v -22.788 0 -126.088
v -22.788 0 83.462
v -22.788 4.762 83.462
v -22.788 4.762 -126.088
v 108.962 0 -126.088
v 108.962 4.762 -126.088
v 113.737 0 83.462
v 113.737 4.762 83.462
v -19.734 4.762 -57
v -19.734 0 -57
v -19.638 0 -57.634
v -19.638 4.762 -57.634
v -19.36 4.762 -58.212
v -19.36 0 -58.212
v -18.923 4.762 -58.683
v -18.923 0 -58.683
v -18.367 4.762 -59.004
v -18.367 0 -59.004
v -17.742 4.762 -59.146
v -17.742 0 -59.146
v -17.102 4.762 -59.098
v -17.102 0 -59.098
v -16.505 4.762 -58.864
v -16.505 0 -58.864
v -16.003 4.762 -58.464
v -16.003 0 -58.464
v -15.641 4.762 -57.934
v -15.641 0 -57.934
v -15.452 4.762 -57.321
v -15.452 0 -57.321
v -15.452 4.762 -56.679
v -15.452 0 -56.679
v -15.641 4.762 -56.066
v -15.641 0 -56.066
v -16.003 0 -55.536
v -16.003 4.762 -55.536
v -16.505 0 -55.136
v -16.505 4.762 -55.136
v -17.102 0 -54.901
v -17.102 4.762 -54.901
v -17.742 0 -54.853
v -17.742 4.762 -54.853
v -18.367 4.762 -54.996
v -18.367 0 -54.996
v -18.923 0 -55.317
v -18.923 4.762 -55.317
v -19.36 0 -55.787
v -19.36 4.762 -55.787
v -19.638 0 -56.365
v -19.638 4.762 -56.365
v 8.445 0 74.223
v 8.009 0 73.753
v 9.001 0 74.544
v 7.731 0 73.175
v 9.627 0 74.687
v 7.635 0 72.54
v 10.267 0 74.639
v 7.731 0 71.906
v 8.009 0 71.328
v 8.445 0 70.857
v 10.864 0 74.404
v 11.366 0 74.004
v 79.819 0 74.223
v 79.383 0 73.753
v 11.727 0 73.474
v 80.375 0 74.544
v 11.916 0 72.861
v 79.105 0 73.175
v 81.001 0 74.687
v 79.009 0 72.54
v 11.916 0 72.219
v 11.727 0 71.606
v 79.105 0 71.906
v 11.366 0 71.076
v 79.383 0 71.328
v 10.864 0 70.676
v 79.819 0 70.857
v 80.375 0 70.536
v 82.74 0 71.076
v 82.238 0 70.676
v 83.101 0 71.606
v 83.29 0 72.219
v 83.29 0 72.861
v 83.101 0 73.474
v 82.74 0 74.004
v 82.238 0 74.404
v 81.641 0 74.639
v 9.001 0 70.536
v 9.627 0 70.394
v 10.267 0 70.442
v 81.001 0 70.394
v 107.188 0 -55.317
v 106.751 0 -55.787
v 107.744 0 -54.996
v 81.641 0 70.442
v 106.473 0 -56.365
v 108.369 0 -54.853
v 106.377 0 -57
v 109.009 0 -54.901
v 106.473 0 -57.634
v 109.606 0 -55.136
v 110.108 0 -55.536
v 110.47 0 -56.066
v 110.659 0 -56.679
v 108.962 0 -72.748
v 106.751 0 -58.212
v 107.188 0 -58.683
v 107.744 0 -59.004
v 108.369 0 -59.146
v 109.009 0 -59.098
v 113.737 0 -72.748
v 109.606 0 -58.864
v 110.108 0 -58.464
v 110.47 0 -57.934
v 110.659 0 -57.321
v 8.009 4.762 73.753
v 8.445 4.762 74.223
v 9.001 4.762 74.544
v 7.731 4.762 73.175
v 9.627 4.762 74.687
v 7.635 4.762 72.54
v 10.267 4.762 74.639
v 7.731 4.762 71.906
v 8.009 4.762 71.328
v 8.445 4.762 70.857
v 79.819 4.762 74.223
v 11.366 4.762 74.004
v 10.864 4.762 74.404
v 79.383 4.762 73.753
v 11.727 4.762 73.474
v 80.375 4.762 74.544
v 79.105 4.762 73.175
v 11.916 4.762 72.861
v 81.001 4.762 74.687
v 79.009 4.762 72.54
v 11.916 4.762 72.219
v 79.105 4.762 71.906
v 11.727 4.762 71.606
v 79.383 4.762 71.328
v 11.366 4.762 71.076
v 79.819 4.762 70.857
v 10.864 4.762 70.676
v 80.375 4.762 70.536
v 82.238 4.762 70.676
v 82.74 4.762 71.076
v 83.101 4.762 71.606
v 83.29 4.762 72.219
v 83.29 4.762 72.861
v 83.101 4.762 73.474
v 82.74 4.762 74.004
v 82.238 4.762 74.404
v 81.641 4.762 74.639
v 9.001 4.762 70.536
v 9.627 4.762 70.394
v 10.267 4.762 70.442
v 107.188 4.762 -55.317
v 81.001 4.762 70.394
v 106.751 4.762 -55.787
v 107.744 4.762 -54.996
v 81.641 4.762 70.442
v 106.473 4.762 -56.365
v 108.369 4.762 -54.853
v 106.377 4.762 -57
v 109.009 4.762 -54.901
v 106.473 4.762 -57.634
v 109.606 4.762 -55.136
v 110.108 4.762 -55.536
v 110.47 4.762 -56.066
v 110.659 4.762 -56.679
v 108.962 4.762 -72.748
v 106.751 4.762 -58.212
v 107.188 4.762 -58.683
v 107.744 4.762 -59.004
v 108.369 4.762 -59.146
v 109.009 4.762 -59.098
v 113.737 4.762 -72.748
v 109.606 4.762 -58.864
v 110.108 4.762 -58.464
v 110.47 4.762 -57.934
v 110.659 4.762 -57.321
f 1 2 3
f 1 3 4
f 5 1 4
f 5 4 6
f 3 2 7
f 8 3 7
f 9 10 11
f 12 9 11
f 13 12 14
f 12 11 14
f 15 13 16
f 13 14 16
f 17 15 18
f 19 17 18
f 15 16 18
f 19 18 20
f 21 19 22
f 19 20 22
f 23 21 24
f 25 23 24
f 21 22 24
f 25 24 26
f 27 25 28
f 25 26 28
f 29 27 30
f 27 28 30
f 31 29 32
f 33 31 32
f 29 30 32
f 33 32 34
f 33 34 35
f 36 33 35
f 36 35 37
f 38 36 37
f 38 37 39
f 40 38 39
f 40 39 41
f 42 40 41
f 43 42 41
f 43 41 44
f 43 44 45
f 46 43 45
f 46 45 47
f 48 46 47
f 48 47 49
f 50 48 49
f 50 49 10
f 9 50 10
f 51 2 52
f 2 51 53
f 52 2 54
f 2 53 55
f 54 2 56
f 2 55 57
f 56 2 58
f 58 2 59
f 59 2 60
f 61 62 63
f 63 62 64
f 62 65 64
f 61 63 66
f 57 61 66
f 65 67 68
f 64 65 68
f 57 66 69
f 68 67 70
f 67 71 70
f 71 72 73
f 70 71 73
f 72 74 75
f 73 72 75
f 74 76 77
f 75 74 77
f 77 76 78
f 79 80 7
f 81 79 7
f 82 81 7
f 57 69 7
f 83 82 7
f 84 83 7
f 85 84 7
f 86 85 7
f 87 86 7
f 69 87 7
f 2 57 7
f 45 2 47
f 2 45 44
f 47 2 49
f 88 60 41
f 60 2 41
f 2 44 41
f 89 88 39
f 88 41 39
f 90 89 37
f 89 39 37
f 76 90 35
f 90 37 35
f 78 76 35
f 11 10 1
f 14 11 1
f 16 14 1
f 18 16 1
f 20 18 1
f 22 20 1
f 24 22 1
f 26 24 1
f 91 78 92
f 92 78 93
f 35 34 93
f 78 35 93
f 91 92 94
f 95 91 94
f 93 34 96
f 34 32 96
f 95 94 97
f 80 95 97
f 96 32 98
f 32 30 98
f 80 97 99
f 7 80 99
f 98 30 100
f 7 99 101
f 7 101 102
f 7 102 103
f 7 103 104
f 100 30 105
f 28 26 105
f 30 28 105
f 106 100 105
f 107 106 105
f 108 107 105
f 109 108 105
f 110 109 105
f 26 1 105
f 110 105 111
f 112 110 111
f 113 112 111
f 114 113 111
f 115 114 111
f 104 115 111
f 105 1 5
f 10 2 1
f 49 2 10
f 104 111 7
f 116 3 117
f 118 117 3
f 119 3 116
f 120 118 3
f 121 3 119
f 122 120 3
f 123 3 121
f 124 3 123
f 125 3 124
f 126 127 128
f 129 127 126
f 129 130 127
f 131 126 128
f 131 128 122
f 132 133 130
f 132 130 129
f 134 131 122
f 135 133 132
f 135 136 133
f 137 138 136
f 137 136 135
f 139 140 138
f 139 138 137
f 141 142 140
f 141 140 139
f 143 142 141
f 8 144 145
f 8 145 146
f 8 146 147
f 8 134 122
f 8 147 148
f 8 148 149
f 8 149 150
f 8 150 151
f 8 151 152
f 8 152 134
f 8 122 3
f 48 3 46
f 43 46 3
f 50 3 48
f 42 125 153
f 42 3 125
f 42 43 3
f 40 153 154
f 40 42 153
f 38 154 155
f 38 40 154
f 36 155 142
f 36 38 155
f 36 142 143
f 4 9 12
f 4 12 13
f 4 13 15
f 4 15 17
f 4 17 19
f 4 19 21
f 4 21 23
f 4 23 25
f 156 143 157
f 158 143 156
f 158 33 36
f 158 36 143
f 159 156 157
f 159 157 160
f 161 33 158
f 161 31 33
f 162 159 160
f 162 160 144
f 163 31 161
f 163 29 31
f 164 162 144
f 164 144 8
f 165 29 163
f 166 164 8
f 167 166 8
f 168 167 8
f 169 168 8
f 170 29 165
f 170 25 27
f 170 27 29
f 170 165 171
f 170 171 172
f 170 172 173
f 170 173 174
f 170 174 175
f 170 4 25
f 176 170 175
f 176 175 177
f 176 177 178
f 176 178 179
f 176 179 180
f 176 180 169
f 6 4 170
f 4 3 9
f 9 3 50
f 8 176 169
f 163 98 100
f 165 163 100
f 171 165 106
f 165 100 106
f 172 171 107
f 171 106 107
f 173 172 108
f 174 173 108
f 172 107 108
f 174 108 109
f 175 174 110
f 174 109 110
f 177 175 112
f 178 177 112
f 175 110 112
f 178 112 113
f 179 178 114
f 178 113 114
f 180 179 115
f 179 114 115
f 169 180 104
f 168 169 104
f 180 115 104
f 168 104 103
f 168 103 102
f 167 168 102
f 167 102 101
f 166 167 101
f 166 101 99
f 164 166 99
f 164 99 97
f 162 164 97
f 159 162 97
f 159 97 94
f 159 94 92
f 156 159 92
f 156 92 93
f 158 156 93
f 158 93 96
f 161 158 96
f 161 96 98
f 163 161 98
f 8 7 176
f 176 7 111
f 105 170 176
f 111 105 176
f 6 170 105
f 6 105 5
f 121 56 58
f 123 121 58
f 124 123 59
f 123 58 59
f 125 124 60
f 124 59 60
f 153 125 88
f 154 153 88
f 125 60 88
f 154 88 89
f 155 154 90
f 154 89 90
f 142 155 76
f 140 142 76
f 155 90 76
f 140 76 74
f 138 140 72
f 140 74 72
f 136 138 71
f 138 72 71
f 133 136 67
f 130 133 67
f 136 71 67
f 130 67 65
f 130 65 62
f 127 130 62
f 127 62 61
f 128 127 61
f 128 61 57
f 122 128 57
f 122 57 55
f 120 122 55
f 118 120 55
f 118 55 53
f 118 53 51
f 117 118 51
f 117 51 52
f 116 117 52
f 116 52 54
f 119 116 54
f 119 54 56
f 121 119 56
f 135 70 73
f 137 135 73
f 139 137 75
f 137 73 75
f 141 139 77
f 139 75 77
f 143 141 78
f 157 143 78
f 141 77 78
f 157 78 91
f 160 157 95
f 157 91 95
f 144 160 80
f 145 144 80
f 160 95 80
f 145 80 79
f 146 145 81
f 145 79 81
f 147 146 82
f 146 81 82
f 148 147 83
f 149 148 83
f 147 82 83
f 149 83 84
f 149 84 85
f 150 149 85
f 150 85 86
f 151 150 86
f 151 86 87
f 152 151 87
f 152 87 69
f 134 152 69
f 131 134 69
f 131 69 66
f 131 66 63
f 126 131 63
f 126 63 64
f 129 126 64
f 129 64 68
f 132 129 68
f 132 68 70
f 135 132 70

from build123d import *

# Parameters (mm, degrees)
SKETCH1_W             = 136.525
SKETCH1_H             = 209.55
BOSS_EXTRUDE1_DEPTH   = 4.7625
SKETCH2_W             = 4.7752
SKETCH2_H             = 53.34
CUT_EXTRUDE1_DEPTH    = 170.873266436
F_8_CLEARANCE_HOLE1_D = 4.3053


with BuildPart() as part:
    # Sketch1 → Boss-Extrude1 (new body)
    with BuildSketch(Plane(origin=(0, 0, 0), x_dir=(1, 0, 0), z_dir=(0, 1, 0))):
        with Locations((45.474550145, 21.312781595)):
            Rectangle(SKETCH1_W, SKETCH1_H)
    extrude(amount=BOSS_EXTRUDE1_DEPTH)

    # Sketch2 → Cut-Extrude1 (cut, through all)
    with BuildSketch(Plane(origin=(0, 4.7625, 0), x_dir=(1, 0, 0), z_dir=(0, 1, 0))):
        with Locations((111.349450145, 99.417781595)):
            Rectangle(SKETCH2_W, SKETCH2_H)
    extrude(amount=-CUT_EXTRUDE1_DEPTH, mode=Mode.SUBTRACT)

    # #8 Clearance Hole1 (through all)
    with Locations(Plane(origin=(0, 4.7625, 0), x_dir=(1, 0, 0), z_dir=(0, 1, 0))):
        with Locations((81.161550145, -72.540218405), (9.787550145, -72.540218405), (-17.580949855, 56.999781595), (108.530050145, 56.999781595)):
            Hole(F_8_CLEARANCE_HOLE1_D / 2)


solid = part.part
